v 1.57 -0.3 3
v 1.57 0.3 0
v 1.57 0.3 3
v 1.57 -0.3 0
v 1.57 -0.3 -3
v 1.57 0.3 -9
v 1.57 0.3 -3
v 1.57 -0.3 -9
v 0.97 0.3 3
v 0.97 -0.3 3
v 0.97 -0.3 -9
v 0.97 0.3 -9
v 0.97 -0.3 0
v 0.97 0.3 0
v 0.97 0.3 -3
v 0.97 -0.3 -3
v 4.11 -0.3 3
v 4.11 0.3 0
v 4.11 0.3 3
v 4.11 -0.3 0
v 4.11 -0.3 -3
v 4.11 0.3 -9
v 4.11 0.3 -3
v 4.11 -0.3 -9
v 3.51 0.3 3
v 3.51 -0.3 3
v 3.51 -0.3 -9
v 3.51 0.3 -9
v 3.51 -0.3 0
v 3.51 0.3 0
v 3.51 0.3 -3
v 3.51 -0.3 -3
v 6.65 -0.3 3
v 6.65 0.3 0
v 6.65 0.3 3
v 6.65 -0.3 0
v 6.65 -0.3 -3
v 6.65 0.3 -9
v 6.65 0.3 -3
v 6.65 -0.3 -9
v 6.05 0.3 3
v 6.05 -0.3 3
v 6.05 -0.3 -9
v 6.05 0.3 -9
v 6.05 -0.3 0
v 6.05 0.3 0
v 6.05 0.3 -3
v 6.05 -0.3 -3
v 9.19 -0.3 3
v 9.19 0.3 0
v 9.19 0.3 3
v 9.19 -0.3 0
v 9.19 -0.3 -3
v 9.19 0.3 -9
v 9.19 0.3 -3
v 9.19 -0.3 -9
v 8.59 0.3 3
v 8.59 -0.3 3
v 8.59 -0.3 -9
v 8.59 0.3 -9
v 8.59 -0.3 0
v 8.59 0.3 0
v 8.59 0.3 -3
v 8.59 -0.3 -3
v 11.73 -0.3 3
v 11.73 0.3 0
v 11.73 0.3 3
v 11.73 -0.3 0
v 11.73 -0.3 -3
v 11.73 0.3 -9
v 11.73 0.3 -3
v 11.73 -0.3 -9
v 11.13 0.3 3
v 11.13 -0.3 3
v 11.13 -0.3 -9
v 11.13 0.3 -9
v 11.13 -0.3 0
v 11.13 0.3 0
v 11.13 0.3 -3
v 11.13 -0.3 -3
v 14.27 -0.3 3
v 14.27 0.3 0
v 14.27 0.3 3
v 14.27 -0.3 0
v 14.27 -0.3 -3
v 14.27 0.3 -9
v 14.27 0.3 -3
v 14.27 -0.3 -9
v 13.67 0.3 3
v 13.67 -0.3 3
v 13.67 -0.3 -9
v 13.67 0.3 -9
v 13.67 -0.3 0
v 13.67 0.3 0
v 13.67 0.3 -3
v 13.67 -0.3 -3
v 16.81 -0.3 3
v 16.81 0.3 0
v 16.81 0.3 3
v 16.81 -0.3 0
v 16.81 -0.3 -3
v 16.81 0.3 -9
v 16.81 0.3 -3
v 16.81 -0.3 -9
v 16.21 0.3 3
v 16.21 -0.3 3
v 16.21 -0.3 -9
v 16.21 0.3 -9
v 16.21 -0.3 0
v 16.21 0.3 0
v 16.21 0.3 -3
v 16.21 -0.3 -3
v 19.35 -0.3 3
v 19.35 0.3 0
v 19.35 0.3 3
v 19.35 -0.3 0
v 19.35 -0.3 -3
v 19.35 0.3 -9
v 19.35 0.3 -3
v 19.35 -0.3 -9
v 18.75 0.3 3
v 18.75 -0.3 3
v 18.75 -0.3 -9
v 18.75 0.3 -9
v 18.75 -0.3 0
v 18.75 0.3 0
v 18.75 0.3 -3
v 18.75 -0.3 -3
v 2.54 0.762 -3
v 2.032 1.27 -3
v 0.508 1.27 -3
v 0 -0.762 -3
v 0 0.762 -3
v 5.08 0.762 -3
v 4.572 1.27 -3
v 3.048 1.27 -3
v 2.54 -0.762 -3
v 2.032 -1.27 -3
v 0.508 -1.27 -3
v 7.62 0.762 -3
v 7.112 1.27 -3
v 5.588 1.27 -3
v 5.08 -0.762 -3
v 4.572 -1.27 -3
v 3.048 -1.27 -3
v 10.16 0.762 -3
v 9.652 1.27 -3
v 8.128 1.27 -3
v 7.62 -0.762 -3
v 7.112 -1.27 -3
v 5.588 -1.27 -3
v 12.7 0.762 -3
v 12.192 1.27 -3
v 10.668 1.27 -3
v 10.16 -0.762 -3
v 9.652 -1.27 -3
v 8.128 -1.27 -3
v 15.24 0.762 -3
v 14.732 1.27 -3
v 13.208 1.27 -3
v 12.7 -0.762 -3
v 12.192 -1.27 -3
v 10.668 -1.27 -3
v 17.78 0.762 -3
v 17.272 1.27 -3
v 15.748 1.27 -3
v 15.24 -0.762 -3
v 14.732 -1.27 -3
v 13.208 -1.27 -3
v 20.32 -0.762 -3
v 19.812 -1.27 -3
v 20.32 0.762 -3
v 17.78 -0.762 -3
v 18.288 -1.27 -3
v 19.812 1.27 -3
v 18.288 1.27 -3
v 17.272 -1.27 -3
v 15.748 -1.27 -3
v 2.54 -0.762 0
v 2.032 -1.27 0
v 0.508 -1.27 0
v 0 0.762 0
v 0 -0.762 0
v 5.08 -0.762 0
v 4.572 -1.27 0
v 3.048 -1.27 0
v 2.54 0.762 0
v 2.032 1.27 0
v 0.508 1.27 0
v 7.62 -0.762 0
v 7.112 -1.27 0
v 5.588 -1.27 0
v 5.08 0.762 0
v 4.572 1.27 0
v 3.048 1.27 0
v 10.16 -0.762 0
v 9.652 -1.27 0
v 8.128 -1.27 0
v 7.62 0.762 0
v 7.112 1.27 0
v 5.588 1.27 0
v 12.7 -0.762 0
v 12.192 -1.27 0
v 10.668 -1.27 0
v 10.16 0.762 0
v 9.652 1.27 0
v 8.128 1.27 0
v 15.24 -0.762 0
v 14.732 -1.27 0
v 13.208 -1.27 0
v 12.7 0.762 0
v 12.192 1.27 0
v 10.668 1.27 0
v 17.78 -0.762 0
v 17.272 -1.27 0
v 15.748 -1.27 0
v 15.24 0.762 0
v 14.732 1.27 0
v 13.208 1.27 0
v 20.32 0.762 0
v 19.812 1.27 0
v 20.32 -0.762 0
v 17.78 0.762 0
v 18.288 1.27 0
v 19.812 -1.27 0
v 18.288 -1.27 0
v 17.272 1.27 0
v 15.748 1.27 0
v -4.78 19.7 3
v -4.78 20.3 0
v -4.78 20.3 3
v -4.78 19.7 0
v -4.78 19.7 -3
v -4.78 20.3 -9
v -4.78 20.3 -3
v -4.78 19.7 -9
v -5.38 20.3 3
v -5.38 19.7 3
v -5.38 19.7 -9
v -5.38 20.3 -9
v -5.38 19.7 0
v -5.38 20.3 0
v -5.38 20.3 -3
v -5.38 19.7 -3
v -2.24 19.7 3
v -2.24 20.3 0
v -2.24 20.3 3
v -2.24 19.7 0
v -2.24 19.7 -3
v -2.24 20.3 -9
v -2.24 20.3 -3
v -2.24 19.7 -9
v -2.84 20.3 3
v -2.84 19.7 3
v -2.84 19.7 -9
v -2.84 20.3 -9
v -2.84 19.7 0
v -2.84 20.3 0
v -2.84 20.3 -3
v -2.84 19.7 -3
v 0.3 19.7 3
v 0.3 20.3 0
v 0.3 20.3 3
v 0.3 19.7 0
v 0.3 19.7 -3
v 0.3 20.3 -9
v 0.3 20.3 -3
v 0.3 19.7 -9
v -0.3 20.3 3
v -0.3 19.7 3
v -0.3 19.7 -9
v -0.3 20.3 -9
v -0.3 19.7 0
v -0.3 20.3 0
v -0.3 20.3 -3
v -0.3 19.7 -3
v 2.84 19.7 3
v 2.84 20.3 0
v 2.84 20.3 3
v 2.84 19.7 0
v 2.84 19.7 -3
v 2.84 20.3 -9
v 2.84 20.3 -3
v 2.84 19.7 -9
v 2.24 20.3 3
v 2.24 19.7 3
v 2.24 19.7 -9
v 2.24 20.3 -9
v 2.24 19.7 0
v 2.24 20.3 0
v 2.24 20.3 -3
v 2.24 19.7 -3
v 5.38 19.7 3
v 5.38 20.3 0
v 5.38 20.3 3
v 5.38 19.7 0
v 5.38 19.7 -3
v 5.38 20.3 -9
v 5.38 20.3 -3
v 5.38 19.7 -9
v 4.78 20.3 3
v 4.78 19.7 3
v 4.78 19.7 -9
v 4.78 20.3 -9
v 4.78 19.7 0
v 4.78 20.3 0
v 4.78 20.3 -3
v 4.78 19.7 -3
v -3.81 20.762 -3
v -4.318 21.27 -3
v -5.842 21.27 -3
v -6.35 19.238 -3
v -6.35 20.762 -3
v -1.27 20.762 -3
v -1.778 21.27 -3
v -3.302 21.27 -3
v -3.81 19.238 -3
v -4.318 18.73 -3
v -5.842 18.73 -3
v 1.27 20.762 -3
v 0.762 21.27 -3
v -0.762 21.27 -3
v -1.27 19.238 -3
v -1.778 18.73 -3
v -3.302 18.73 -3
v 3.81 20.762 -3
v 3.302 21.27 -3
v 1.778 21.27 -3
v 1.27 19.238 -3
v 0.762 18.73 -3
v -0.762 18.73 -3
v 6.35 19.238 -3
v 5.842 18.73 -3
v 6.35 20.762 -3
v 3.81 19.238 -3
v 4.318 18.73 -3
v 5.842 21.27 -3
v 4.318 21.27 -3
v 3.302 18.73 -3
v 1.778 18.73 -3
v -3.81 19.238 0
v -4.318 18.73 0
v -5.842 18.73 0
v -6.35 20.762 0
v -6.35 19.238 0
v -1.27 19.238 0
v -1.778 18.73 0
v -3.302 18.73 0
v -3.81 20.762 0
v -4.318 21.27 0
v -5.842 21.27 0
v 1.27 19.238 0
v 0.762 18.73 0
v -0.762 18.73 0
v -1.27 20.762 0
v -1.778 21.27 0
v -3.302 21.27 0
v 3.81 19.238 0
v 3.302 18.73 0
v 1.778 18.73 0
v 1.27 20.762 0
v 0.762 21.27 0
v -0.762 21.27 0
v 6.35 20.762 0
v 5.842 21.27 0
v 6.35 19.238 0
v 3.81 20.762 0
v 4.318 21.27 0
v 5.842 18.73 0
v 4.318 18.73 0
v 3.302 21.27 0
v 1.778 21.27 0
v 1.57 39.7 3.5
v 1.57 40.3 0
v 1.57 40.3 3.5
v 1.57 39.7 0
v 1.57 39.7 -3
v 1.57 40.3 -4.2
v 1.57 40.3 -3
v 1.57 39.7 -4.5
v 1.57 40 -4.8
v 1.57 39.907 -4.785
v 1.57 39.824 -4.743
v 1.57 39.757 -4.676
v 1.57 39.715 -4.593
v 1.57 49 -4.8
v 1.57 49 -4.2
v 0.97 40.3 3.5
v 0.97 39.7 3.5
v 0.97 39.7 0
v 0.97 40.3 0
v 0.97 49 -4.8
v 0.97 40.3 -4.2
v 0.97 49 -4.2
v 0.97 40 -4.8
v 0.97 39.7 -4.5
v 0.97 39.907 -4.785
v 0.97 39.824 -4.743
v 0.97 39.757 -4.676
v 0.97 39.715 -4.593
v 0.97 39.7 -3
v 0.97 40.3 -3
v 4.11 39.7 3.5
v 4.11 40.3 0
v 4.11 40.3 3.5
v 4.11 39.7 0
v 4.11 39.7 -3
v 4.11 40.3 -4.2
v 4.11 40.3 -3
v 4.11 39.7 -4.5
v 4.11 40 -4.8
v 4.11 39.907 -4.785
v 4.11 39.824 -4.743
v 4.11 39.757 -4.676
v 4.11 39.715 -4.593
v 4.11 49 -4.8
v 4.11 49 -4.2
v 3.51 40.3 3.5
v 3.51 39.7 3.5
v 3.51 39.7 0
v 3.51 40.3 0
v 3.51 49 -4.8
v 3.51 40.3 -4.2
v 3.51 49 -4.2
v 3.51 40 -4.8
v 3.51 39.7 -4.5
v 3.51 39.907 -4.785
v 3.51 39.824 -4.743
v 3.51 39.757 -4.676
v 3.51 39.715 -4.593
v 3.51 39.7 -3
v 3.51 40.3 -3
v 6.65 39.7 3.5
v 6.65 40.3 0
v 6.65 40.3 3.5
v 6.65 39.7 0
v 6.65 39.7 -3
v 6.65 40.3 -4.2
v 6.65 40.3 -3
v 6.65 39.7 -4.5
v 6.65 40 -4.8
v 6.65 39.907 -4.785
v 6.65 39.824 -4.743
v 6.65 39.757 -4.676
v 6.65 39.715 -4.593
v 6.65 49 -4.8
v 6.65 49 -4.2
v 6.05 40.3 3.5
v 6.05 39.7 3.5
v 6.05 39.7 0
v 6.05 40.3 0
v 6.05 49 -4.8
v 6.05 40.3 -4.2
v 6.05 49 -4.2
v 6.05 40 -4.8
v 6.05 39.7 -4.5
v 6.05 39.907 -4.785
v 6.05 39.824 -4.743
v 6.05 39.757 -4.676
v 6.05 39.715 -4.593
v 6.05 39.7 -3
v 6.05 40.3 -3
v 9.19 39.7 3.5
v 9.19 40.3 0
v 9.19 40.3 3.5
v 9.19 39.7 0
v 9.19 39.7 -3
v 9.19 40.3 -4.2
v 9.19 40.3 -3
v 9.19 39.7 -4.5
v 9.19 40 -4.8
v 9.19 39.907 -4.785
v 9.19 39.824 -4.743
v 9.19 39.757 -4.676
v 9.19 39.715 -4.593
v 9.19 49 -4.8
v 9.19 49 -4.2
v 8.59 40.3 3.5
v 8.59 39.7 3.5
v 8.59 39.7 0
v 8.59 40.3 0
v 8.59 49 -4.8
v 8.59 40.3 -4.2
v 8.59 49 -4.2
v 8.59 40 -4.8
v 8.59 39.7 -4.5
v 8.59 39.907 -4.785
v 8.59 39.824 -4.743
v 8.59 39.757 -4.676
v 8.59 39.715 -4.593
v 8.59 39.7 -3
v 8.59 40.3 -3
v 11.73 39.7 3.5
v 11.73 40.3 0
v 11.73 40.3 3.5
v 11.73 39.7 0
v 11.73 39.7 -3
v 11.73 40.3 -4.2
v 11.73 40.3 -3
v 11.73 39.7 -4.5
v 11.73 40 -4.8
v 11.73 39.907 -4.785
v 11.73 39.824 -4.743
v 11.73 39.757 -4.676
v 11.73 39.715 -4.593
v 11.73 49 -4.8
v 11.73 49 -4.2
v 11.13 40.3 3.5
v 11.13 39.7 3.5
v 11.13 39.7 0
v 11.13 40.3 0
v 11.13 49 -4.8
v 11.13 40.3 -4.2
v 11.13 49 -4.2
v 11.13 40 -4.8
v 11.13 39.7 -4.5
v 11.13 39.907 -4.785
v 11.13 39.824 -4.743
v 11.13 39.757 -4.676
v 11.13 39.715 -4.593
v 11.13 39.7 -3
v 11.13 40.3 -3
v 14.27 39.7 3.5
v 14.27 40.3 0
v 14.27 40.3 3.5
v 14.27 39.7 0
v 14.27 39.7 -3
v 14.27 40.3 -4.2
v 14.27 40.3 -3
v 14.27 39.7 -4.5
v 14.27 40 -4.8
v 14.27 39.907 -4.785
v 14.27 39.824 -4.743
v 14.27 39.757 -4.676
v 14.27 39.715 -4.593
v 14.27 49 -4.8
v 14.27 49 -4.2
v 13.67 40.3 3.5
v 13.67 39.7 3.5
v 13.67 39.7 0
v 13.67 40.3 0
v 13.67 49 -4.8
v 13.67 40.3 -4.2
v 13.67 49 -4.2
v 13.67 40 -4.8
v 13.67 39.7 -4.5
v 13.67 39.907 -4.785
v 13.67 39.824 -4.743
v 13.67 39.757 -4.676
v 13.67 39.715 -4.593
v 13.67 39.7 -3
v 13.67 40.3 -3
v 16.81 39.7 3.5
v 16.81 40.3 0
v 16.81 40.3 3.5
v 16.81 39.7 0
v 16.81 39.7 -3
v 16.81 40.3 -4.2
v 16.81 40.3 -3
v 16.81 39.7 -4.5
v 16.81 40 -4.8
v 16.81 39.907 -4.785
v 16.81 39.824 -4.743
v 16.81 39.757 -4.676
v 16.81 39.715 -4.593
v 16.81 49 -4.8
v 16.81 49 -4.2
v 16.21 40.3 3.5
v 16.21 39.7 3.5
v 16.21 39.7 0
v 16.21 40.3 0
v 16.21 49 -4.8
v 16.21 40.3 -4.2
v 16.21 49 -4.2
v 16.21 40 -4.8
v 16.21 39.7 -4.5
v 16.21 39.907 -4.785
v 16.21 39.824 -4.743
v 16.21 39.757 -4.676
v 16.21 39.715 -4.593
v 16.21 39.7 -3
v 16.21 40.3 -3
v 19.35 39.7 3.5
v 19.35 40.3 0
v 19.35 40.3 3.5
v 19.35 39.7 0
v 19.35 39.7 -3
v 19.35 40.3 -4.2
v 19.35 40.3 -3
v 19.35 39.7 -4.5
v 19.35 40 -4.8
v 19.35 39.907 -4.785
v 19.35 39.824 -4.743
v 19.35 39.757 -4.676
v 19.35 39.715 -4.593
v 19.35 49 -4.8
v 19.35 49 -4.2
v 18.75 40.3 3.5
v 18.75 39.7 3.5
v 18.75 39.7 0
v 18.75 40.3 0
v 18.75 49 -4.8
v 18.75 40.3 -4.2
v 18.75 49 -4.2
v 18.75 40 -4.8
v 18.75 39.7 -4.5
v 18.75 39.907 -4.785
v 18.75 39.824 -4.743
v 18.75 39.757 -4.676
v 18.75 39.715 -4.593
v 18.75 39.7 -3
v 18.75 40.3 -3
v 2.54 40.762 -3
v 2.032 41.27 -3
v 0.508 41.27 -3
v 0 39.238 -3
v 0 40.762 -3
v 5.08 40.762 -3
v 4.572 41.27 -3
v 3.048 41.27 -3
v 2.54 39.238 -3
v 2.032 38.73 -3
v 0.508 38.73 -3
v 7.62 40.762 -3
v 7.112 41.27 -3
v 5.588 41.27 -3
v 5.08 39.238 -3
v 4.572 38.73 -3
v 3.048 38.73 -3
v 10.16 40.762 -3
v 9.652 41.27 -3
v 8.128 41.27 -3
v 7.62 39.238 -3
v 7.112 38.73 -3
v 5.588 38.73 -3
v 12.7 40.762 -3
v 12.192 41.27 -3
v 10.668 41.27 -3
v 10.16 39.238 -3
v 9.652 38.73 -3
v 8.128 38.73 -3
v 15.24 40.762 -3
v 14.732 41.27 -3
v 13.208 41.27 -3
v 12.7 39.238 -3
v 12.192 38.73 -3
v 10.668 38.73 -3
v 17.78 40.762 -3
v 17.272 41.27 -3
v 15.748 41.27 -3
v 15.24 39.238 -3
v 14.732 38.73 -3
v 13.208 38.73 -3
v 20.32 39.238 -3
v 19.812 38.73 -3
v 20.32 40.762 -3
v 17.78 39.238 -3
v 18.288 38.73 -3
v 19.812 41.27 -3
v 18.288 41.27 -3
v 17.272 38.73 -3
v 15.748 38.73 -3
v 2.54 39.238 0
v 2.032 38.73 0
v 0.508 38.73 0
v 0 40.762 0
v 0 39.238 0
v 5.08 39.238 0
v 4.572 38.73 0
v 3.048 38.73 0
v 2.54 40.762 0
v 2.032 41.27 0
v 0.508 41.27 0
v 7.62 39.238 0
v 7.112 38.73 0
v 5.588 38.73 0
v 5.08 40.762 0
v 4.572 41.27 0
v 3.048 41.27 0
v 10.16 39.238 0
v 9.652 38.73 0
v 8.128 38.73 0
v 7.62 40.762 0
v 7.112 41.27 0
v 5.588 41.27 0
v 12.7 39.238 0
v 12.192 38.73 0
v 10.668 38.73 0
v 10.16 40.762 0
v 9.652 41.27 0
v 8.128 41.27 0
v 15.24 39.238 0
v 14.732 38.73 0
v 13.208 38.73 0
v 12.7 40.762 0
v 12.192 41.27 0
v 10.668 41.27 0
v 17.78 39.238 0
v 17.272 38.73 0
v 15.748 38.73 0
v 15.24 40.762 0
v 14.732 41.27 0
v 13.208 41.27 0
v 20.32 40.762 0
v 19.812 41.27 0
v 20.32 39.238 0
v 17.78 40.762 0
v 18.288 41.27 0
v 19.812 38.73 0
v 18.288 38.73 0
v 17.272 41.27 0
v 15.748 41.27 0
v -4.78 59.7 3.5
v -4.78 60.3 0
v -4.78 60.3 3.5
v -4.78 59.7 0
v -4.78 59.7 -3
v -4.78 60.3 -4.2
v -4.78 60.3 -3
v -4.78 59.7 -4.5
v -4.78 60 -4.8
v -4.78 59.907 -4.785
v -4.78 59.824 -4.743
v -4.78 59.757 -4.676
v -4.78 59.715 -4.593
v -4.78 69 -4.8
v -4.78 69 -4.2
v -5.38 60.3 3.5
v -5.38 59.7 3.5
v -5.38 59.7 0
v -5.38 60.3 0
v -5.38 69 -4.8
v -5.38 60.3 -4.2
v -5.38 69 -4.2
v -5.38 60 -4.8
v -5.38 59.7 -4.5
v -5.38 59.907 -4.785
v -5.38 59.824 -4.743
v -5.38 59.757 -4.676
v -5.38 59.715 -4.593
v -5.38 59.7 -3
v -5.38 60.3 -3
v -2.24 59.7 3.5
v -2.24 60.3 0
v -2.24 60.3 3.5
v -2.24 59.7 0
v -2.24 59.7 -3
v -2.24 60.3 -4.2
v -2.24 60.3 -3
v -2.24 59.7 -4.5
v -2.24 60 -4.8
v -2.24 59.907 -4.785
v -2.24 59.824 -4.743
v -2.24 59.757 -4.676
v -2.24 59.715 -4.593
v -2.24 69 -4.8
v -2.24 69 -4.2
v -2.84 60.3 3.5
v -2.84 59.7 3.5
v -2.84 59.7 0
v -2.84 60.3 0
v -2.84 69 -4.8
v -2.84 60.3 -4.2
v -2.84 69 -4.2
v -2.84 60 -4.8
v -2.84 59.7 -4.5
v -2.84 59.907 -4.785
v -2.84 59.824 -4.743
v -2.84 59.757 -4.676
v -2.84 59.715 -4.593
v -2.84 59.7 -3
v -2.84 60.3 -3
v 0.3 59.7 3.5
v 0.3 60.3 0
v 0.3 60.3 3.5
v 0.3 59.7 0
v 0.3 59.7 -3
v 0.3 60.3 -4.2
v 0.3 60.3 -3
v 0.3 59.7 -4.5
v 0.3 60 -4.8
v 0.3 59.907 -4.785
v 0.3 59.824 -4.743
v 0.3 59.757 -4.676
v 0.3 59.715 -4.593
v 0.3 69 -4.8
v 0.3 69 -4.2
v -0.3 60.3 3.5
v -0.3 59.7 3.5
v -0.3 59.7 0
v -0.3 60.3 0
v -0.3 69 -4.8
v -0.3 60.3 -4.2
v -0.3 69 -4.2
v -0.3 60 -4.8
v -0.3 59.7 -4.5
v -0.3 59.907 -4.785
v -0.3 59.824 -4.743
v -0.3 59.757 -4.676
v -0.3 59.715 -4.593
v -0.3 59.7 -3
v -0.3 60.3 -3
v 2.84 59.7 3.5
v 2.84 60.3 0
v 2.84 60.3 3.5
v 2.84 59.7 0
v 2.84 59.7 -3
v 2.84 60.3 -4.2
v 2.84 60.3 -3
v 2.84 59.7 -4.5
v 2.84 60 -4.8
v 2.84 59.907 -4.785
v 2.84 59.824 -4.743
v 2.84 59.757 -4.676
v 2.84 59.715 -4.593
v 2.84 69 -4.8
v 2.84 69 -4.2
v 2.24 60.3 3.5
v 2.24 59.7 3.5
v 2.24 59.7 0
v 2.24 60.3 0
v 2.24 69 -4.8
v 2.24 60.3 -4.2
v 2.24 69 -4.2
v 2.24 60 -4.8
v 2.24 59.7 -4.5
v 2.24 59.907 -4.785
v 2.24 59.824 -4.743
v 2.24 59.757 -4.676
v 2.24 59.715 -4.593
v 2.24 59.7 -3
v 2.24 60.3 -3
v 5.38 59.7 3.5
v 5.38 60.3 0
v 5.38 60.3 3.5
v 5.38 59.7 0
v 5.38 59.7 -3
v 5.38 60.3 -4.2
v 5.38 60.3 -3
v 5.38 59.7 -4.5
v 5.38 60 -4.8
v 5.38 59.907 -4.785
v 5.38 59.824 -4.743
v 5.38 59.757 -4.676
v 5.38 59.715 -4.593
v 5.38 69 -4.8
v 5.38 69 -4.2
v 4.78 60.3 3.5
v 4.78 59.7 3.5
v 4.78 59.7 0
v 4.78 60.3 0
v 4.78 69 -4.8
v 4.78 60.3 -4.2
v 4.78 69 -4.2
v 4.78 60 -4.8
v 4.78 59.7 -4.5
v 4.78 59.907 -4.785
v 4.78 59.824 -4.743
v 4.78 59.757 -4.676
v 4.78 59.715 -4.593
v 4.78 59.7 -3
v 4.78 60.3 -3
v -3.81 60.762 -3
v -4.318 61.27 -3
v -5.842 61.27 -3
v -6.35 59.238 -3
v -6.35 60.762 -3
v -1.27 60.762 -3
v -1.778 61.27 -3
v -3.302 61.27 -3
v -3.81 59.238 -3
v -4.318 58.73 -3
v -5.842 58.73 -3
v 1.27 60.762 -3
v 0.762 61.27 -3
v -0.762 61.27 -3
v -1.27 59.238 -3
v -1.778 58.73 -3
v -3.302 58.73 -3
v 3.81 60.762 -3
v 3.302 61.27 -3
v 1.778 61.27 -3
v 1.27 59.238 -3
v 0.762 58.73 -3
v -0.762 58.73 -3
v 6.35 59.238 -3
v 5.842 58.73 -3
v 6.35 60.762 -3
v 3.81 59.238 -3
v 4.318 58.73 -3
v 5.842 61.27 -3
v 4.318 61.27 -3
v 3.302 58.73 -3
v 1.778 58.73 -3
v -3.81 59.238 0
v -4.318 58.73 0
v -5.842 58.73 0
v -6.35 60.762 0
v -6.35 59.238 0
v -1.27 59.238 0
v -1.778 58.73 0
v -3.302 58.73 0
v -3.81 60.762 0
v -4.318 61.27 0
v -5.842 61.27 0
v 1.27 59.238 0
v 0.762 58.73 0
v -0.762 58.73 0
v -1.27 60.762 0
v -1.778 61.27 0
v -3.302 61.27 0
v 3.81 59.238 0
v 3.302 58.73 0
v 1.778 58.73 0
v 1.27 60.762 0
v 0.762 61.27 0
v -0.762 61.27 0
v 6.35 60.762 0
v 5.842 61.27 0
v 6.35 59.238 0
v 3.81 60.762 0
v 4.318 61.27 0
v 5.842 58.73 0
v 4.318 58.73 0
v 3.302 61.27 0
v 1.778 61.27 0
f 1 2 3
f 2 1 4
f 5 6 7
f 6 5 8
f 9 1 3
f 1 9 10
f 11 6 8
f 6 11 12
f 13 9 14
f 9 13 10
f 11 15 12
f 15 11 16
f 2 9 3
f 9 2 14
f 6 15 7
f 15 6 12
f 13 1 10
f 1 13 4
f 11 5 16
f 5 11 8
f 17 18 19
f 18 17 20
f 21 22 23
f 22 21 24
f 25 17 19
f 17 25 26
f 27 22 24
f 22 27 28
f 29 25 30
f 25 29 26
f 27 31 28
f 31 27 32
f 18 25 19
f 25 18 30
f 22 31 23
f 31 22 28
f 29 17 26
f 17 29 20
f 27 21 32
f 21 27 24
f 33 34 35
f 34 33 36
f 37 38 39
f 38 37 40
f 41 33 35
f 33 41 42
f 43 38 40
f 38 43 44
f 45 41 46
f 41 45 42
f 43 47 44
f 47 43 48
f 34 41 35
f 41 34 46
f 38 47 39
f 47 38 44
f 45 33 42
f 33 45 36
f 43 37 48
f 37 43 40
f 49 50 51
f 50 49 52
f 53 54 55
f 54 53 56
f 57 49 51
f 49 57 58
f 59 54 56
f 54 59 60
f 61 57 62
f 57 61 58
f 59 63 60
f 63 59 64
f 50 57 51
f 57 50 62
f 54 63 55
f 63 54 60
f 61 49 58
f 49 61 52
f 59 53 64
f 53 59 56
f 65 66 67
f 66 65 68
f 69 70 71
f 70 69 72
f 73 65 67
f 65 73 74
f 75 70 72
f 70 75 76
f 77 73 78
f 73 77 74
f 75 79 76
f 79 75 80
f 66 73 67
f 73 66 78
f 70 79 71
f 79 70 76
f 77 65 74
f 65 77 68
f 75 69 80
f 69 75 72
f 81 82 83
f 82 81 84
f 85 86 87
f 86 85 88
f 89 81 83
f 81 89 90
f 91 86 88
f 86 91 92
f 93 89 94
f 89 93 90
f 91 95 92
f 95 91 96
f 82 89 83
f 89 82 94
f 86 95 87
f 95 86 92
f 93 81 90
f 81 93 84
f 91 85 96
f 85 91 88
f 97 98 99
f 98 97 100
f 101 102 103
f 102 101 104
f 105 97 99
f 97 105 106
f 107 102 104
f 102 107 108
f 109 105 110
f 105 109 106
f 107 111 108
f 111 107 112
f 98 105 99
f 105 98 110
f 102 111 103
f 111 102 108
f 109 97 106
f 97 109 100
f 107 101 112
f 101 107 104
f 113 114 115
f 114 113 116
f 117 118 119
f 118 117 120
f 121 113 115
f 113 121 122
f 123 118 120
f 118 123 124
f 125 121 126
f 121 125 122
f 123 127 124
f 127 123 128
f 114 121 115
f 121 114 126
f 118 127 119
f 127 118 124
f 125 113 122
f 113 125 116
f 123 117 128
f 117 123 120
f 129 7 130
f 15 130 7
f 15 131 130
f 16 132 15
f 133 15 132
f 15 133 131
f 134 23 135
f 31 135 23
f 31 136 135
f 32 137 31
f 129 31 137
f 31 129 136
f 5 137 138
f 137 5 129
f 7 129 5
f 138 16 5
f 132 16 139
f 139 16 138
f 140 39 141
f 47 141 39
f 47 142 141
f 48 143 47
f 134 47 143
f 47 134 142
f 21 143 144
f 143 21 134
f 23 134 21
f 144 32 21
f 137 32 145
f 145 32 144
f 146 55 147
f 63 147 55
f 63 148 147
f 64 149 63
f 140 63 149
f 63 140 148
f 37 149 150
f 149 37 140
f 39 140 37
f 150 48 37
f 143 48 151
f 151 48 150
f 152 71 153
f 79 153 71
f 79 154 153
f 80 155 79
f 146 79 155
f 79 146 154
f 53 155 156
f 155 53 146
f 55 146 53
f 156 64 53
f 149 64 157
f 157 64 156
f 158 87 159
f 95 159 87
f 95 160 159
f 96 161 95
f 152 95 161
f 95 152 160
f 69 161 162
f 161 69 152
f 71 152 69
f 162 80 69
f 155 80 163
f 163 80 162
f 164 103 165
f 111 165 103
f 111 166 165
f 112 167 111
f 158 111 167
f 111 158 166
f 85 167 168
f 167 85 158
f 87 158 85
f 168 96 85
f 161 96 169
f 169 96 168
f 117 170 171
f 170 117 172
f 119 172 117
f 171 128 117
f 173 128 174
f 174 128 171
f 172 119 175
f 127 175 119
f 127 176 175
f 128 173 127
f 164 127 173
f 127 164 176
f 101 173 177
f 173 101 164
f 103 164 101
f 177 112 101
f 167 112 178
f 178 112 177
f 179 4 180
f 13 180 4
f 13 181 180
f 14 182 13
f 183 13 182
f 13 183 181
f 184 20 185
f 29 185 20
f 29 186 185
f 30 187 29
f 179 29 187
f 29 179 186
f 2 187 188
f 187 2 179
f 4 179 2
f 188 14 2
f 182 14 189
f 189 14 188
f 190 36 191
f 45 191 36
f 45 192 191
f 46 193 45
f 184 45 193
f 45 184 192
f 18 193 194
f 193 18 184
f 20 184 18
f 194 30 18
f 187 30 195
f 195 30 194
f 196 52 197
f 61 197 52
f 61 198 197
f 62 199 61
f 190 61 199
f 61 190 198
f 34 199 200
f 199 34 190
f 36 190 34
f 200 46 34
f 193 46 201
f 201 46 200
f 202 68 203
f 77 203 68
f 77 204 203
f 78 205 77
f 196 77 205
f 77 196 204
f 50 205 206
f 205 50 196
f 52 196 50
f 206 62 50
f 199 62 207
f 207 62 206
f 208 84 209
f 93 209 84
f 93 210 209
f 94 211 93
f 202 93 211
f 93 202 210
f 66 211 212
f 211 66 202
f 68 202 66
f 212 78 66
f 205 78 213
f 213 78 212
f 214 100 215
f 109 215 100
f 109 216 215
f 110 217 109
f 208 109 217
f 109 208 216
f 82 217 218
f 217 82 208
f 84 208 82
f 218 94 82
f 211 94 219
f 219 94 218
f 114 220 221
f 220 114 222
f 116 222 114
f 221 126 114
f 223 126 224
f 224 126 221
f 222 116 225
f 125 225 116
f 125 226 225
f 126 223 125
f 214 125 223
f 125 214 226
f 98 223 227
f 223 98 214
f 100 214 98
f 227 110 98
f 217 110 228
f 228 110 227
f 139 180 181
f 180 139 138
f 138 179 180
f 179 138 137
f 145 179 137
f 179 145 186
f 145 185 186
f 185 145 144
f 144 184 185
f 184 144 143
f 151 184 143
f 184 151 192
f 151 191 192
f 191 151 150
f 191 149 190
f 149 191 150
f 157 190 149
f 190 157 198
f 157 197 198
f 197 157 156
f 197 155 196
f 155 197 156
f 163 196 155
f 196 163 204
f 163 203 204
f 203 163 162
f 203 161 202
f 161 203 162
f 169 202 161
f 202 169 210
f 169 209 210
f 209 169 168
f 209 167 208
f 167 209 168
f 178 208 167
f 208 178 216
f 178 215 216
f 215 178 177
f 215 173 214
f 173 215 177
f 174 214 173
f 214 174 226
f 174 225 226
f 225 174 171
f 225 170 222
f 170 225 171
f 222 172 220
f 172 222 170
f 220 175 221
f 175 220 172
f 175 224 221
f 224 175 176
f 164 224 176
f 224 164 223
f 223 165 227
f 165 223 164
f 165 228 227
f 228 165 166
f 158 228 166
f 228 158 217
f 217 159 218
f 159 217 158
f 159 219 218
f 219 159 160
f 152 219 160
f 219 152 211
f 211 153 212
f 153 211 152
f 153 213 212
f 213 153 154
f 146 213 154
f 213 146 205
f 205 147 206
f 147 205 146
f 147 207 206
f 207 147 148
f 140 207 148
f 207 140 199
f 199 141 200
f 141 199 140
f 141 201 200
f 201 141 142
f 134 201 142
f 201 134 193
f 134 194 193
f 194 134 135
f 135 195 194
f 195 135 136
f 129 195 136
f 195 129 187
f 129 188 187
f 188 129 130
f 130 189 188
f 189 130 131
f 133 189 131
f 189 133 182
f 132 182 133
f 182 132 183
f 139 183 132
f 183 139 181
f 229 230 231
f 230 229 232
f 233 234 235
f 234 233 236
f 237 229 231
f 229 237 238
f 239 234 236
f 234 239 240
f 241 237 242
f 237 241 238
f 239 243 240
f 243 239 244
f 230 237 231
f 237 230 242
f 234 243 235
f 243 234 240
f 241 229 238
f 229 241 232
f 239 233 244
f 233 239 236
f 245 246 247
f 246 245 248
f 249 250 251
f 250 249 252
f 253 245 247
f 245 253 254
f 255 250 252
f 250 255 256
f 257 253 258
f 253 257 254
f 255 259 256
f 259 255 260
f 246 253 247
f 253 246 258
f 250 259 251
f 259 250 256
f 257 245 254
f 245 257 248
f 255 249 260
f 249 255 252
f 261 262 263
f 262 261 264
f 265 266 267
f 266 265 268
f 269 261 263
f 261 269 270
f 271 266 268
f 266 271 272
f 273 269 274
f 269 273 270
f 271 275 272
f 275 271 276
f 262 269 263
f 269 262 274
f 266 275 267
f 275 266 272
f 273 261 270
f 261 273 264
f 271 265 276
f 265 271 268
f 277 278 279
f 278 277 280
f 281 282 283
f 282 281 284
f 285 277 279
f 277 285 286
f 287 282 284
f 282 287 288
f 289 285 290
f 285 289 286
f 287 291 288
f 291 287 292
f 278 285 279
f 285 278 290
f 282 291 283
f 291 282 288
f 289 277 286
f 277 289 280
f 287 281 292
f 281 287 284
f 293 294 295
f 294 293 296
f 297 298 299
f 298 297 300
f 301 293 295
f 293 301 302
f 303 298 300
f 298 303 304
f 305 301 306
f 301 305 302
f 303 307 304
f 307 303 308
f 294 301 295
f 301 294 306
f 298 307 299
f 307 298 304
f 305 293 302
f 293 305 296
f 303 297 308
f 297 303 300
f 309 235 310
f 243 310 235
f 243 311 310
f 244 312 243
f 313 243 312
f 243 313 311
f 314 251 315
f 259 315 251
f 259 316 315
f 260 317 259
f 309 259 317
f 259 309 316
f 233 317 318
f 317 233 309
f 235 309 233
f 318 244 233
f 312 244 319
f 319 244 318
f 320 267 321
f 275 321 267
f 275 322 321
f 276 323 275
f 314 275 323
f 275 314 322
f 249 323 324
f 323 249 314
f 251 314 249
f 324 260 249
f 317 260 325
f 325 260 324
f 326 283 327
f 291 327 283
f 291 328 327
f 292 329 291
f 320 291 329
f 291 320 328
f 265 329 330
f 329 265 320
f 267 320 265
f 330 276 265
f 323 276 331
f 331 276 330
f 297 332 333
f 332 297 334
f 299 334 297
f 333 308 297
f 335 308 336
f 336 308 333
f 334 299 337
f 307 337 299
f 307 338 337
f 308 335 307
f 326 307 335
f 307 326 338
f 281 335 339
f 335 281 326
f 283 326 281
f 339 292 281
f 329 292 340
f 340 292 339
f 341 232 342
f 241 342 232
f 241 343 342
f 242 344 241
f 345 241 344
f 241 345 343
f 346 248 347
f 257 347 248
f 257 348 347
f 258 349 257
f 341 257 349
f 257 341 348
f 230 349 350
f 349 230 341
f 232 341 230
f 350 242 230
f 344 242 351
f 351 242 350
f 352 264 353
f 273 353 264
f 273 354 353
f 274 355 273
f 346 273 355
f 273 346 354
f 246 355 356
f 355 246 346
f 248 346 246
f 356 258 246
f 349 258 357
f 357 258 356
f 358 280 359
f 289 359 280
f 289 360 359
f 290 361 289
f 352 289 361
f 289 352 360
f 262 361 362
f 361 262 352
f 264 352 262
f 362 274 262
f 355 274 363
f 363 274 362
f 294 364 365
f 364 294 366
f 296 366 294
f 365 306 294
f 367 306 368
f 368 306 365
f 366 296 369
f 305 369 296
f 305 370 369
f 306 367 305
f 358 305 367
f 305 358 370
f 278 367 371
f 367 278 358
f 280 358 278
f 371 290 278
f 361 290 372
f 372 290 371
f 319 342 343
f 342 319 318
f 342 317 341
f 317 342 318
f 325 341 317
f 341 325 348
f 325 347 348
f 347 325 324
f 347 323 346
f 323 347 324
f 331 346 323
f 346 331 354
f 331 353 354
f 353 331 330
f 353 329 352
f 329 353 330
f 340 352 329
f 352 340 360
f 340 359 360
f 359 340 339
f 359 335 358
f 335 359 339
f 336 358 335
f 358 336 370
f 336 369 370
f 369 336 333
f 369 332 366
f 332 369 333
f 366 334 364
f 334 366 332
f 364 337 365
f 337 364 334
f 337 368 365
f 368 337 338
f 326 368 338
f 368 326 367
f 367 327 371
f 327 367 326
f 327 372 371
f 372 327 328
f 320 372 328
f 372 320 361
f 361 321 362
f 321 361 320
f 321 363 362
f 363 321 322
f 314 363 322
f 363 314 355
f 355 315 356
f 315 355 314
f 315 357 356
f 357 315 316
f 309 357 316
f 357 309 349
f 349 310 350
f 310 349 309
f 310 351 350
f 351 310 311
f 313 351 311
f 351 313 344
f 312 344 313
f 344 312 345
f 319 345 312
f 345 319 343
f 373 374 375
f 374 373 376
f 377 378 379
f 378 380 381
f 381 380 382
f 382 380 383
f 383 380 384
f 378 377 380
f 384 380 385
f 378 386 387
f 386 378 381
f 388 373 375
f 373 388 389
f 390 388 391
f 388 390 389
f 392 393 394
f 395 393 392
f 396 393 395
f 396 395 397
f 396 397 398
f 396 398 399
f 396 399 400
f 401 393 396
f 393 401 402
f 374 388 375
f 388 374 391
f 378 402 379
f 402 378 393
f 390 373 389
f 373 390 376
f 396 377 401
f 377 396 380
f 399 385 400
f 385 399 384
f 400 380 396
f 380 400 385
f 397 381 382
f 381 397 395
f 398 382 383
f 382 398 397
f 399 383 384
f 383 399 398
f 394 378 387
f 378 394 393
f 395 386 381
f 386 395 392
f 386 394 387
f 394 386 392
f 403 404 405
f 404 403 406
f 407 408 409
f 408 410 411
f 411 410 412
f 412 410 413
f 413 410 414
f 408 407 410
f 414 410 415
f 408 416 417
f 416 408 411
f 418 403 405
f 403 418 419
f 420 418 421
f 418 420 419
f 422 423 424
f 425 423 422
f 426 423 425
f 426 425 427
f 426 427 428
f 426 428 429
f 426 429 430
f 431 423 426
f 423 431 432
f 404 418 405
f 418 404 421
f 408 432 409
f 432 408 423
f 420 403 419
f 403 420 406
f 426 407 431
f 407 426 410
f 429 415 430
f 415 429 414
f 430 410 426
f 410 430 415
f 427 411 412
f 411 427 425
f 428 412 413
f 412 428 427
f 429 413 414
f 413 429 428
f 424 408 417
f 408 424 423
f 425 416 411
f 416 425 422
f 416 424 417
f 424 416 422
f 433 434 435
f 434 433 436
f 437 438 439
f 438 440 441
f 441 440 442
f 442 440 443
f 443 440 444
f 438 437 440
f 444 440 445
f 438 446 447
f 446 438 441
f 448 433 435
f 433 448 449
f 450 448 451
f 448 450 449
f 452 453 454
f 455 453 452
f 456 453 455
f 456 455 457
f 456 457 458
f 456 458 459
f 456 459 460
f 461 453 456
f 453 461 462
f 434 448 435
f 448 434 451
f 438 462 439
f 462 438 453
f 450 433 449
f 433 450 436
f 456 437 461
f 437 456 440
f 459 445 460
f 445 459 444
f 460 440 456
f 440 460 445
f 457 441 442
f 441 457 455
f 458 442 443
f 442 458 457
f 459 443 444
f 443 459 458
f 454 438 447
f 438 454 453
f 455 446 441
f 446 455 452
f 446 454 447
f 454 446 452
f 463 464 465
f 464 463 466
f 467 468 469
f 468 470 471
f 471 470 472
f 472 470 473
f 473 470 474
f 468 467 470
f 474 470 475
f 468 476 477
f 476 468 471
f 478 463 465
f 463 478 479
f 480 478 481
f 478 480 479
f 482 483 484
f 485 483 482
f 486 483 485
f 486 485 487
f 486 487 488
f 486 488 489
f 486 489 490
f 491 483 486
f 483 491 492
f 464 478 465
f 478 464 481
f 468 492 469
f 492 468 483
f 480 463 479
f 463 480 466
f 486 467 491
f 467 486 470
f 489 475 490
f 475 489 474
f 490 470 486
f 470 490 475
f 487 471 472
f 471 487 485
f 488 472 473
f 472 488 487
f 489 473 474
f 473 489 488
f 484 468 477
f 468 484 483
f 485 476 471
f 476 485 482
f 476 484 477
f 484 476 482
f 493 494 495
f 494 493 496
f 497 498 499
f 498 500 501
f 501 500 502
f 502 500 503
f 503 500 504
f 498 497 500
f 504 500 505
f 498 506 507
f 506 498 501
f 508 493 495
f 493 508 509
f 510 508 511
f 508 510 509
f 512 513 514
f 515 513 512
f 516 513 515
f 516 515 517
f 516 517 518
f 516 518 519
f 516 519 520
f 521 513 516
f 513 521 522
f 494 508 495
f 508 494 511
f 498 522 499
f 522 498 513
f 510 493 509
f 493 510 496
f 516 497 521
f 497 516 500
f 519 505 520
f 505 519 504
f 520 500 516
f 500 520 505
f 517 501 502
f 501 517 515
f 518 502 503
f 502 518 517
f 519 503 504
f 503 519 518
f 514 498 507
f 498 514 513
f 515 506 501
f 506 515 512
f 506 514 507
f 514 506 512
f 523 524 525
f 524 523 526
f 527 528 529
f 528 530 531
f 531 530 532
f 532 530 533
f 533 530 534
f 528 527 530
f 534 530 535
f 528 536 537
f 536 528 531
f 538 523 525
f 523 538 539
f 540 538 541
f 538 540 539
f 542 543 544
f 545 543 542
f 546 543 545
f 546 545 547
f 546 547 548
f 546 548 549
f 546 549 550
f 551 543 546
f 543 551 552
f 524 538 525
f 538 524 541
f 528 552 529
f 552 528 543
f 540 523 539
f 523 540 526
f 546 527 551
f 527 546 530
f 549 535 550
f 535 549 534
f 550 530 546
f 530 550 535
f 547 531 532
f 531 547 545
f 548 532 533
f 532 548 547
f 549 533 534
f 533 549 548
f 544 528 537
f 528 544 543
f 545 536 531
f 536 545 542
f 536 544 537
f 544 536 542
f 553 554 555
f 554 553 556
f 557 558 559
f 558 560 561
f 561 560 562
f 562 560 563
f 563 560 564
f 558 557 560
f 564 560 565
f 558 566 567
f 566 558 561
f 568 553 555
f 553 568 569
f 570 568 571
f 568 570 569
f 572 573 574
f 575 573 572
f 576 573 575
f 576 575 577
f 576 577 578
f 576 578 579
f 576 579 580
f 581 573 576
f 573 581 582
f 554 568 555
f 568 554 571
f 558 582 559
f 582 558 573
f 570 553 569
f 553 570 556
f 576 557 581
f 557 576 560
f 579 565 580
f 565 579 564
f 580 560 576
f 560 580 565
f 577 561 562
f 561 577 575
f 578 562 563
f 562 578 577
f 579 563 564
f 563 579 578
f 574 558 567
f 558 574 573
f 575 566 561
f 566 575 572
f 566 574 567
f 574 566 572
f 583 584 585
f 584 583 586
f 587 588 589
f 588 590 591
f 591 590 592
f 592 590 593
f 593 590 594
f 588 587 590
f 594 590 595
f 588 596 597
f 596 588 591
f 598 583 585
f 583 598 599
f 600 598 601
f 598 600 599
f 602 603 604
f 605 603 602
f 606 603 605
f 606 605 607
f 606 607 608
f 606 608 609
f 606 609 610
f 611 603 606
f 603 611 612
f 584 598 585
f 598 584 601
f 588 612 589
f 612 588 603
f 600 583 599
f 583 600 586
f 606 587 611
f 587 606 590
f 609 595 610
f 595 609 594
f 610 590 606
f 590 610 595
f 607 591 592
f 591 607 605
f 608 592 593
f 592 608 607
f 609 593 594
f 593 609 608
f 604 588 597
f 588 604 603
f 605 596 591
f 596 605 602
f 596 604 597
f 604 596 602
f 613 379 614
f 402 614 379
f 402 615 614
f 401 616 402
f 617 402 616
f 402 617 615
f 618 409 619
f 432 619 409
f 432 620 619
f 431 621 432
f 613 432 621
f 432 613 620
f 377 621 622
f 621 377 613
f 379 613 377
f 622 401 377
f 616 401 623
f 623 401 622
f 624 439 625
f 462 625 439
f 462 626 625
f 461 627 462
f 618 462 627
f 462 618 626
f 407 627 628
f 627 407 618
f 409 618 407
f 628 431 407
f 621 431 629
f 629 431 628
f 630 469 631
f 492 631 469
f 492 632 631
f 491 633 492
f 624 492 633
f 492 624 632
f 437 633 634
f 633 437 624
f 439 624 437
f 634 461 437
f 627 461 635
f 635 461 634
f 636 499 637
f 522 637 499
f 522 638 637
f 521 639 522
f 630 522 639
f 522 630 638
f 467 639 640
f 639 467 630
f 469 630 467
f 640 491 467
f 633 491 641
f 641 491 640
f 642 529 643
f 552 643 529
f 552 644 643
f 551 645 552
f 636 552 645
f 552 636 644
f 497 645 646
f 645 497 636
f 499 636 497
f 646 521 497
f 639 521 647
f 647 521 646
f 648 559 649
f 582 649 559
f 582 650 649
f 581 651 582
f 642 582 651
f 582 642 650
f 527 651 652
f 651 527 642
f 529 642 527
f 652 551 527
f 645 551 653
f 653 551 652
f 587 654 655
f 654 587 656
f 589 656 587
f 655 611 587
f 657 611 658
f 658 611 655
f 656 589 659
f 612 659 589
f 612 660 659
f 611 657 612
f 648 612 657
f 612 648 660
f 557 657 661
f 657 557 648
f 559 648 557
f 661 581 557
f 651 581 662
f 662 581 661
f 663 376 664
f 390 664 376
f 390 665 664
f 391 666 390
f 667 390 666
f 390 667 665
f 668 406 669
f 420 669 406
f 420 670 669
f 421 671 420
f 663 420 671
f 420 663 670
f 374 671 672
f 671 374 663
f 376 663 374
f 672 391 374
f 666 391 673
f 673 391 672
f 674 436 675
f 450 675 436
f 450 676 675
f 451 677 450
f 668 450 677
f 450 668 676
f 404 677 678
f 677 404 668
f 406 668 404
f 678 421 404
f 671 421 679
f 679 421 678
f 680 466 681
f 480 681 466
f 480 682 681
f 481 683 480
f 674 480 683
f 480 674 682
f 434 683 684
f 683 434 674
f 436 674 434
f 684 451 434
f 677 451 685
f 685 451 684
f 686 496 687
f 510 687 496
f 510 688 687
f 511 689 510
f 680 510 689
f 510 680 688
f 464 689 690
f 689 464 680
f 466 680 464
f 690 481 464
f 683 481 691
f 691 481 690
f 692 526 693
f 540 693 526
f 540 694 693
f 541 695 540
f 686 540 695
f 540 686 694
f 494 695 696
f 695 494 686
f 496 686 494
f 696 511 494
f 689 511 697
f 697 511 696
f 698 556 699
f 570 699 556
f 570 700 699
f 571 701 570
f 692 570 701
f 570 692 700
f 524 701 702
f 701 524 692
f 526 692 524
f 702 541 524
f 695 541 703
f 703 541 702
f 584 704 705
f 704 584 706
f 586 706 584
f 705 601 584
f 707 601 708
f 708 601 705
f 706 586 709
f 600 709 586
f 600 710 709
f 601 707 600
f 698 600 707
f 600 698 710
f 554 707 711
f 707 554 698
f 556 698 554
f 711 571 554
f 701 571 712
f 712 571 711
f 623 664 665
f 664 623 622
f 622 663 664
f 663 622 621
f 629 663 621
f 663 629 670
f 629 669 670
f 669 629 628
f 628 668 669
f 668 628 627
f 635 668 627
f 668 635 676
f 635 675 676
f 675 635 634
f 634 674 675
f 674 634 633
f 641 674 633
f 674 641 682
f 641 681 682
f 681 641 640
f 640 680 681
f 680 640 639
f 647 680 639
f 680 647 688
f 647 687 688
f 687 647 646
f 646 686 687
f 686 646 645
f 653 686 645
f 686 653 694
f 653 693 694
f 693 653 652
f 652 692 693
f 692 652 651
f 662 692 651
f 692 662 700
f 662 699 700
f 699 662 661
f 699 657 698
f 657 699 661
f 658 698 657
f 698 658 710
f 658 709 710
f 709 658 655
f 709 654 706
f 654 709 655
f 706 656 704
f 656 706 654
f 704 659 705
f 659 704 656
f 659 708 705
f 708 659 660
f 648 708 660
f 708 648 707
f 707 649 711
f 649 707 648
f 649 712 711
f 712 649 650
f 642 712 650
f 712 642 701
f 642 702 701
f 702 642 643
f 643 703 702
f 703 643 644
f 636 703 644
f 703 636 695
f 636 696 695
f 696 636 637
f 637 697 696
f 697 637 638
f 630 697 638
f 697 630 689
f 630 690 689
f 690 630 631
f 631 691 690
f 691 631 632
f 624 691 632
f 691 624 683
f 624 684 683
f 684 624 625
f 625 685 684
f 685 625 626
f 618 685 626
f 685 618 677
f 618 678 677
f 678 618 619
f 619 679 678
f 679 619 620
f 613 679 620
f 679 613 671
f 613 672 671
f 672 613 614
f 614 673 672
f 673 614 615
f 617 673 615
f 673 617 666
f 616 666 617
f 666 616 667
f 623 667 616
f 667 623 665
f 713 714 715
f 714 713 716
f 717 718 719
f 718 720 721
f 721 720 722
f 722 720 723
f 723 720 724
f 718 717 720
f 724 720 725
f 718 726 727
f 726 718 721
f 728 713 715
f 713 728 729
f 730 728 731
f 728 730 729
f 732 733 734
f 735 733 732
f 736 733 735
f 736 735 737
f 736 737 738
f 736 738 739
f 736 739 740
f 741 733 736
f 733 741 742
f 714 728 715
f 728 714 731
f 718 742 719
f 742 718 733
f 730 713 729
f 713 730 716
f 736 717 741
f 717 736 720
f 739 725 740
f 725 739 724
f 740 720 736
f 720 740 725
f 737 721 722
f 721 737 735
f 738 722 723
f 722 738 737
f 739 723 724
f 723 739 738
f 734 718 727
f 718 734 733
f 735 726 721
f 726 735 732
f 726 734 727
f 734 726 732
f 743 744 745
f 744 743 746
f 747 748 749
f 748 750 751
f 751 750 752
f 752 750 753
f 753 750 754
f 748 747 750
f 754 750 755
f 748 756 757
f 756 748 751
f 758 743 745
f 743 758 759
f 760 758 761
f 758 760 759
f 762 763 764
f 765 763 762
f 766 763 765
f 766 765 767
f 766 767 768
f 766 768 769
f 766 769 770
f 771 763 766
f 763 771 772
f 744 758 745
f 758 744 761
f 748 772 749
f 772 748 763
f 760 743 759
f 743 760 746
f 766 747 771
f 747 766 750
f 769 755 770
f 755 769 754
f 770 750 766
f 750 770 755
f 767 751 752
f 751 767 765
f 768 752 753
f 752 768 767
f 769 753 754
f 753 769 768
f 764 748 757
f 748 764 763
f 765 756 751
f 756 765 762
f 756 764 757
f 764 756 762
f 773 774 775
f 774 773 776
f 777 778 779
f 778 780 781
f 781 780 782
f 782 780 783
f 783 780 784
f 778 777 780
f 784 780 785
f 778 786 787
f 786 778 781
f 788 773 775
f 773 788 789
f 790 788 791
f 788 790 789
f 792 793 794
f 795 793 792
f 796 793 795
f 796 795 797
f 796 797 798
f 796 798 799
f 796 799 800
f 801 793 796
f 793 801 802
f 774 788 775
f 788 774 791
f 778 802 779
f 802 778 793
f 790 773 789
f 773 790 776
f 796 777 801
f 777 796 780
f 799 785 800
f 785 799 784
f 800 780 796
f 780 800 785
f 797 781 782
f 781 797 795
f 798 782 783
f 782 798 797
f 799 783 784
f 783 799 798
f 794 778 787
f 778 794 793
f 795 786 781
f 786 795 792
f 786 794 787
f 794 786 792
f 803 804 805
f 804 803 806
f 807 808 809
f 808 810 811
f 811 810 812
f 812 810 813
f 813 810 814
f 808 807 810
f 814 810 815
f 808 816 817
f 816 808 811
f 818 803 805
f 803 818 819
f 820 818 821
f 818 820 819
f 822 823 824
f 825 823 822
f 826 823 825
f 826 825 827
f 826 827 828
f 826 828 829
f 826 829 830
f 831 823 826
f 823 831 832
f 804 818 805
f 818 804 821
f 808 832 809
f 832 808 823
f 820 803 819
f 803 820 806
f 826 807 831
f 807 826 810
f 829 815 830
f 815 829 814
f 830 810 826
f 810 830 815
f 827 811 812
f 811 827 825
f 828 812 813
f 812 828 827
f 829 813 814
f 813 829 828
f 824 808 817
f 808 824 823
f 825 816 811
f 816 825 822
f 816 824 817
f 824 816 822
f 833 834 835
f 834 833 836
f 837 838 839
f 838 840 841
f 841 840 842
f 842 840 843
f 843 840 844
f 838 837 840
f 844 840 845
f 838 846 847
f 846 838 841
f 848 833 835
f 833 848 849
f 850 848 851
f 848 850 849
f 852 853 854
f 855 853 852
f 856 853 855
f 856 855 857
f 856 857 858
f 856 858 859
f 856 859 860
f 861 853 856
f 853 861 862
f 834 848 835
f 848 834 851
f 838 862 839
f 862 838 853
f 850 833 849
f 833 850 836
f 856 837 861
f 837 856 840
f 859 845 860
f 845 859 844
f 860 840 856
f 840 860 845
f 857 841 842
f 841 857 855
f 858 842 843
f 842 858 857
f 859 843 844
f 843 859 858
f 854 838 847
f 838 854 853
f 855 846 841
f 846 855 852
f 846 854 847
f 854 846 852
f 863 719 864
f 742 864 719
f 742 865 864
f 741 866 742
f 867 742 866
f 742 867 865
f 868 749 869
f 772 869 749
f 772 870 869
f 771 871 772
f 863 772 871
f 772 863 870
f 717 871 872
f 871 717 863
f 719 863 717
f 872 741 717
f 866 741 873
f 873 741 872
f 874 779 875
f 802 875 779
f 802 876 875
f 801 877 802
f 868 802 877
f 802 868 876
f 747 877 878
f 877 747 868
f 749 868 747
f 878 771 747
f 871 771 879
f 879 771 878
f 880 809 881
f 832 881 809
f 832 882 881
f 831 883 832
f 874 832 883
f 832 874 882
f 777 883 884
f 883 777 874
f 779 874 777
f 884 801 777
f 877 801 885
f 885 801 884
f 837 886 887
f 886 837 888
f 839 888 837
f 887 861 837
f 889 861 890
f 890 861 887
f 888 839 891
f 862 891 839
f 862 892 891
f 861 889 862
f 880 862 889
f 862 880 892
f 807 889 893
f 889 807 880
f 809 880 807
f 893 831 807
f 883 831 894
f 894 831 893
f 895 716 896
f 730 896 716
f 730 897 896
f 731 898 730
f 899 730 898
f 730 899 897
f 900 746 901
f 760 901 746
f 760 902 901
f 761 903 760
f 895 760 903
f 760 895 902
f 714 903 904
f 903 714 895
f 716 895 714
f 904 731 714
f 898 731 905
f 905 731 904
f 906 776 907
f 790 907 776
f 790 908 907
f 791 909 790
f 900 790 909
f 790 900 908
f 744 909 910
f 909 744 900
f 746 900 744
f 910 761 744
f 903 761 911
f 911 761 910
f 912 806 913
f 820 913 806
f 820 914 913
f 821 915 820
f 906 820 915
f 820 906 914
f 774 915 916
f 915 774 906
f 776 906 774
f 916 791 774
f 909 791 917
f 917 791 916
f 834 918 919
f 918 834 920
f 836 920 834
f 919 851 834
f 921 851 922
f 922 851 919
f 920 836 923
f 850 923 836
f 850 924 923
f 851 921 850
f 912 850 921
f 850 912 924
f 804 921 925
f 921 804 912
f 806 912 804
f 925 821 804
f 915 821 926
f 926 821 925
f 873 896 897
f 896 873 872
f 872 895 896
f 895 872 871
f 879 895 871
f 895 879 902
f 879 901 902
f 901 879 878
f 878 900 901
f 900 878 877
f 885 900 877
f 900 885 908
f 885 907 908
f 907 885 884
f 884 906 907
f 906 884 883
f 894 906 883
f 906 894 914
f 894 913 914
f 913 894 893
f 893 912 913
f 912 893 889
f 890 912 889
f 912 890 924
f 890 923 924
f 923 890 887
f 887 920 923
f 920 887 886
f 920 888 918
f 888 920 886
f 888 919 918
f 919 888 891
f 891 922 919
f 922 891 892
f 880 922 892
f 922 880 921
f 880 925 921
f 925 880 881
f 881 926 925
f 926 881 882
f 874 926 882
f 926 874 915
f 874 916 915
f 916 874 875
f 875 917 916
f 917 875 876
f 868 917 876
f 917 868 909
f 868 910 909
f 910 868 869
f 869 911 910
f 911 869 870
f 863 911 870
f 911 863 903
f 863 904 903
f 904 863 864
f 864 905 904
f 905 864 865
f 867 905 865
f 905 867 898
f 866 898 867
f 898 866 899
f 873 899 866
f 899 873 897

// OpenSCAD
//
// Licensed under the MIT license. See LICENSE file in the project root for details.
//


COLOR_HEADER_PLASTIC = [0.2, 0.2, 0.2];
COLOR_HEADER_METAL = [0.7, 0.7, 0.75];


function pin_header__mirror_point_xy(p, cx=0, cy=0) = [2*cx-p[0], 2*cy-p[1]];
function pin_header__flatten(l) = [for(a=l) for(b=a) b];

function pin_header__make_side_points_for_header(n=1, edge=0.1) = pin_header__flatten(
        [for(i=[0: n-1])
            [[0.5, edge+i], [0.5, 1+i-edge], [0.5-edge, 1.0+i]]]
        );
function pin_header__make_points_for_header(n=1, edge=0.1) = concat(
        [[0.5-edge, 0]],
        pin_header__make_side_points_for_header(n, edge),
        [[-0.5+edge, n]],
        [for(e=pin_header__make_side_points_for_header(n, edge)) pin_header__mirror_point_xy(e, cy=n/2)]
    );

module pin_header(length=1, center=false, angled=false){
    translate([center?-1.27*length: 0, 0, -3]) {
        color(COLOR_HEADER_PLASTIC) linear_extrude(3) scale(2.54) rotate([0, 0, -90]) polygon(pin_header__make_points_for_header(length, 0.2));
        
        color(COLOR_HEADER_METAL) for(i=[0:length-1]){
            if(angled){
                translate([1.27+2.54*i, 0, 2.5]) union(){
                    cube(size=[0.6, 0.6, 8], center=true);
                    translate([0, 0, -4]) rotate([0, 90, 0]) cylinder(r=0.3, h=0.6, center=true);
                    translate([0, 4.5, -4]) cube(size=[0.6, 9, 0.6], center=true);
                }
            }else{
                translate([1.27+2.54*i, 0, 0]) cube(size=[0.6, 0.6, 12], center=true);
            }
        }
    }
}

module pin_header__demo()
{
    translate([0, 0, 0]) pin_header(length=8, center=false, angled=false);
    translate([0, 20, 0]) pin_header(length=5, center=true, angled=false);
    
    translate([0, 40, 0]) pin_header(length=8, center=false, angled=true);
    translate([0, 60, 0]) pin_header(length=5, center=true, angled=true);
}

pin_header__demo($fn=20);
